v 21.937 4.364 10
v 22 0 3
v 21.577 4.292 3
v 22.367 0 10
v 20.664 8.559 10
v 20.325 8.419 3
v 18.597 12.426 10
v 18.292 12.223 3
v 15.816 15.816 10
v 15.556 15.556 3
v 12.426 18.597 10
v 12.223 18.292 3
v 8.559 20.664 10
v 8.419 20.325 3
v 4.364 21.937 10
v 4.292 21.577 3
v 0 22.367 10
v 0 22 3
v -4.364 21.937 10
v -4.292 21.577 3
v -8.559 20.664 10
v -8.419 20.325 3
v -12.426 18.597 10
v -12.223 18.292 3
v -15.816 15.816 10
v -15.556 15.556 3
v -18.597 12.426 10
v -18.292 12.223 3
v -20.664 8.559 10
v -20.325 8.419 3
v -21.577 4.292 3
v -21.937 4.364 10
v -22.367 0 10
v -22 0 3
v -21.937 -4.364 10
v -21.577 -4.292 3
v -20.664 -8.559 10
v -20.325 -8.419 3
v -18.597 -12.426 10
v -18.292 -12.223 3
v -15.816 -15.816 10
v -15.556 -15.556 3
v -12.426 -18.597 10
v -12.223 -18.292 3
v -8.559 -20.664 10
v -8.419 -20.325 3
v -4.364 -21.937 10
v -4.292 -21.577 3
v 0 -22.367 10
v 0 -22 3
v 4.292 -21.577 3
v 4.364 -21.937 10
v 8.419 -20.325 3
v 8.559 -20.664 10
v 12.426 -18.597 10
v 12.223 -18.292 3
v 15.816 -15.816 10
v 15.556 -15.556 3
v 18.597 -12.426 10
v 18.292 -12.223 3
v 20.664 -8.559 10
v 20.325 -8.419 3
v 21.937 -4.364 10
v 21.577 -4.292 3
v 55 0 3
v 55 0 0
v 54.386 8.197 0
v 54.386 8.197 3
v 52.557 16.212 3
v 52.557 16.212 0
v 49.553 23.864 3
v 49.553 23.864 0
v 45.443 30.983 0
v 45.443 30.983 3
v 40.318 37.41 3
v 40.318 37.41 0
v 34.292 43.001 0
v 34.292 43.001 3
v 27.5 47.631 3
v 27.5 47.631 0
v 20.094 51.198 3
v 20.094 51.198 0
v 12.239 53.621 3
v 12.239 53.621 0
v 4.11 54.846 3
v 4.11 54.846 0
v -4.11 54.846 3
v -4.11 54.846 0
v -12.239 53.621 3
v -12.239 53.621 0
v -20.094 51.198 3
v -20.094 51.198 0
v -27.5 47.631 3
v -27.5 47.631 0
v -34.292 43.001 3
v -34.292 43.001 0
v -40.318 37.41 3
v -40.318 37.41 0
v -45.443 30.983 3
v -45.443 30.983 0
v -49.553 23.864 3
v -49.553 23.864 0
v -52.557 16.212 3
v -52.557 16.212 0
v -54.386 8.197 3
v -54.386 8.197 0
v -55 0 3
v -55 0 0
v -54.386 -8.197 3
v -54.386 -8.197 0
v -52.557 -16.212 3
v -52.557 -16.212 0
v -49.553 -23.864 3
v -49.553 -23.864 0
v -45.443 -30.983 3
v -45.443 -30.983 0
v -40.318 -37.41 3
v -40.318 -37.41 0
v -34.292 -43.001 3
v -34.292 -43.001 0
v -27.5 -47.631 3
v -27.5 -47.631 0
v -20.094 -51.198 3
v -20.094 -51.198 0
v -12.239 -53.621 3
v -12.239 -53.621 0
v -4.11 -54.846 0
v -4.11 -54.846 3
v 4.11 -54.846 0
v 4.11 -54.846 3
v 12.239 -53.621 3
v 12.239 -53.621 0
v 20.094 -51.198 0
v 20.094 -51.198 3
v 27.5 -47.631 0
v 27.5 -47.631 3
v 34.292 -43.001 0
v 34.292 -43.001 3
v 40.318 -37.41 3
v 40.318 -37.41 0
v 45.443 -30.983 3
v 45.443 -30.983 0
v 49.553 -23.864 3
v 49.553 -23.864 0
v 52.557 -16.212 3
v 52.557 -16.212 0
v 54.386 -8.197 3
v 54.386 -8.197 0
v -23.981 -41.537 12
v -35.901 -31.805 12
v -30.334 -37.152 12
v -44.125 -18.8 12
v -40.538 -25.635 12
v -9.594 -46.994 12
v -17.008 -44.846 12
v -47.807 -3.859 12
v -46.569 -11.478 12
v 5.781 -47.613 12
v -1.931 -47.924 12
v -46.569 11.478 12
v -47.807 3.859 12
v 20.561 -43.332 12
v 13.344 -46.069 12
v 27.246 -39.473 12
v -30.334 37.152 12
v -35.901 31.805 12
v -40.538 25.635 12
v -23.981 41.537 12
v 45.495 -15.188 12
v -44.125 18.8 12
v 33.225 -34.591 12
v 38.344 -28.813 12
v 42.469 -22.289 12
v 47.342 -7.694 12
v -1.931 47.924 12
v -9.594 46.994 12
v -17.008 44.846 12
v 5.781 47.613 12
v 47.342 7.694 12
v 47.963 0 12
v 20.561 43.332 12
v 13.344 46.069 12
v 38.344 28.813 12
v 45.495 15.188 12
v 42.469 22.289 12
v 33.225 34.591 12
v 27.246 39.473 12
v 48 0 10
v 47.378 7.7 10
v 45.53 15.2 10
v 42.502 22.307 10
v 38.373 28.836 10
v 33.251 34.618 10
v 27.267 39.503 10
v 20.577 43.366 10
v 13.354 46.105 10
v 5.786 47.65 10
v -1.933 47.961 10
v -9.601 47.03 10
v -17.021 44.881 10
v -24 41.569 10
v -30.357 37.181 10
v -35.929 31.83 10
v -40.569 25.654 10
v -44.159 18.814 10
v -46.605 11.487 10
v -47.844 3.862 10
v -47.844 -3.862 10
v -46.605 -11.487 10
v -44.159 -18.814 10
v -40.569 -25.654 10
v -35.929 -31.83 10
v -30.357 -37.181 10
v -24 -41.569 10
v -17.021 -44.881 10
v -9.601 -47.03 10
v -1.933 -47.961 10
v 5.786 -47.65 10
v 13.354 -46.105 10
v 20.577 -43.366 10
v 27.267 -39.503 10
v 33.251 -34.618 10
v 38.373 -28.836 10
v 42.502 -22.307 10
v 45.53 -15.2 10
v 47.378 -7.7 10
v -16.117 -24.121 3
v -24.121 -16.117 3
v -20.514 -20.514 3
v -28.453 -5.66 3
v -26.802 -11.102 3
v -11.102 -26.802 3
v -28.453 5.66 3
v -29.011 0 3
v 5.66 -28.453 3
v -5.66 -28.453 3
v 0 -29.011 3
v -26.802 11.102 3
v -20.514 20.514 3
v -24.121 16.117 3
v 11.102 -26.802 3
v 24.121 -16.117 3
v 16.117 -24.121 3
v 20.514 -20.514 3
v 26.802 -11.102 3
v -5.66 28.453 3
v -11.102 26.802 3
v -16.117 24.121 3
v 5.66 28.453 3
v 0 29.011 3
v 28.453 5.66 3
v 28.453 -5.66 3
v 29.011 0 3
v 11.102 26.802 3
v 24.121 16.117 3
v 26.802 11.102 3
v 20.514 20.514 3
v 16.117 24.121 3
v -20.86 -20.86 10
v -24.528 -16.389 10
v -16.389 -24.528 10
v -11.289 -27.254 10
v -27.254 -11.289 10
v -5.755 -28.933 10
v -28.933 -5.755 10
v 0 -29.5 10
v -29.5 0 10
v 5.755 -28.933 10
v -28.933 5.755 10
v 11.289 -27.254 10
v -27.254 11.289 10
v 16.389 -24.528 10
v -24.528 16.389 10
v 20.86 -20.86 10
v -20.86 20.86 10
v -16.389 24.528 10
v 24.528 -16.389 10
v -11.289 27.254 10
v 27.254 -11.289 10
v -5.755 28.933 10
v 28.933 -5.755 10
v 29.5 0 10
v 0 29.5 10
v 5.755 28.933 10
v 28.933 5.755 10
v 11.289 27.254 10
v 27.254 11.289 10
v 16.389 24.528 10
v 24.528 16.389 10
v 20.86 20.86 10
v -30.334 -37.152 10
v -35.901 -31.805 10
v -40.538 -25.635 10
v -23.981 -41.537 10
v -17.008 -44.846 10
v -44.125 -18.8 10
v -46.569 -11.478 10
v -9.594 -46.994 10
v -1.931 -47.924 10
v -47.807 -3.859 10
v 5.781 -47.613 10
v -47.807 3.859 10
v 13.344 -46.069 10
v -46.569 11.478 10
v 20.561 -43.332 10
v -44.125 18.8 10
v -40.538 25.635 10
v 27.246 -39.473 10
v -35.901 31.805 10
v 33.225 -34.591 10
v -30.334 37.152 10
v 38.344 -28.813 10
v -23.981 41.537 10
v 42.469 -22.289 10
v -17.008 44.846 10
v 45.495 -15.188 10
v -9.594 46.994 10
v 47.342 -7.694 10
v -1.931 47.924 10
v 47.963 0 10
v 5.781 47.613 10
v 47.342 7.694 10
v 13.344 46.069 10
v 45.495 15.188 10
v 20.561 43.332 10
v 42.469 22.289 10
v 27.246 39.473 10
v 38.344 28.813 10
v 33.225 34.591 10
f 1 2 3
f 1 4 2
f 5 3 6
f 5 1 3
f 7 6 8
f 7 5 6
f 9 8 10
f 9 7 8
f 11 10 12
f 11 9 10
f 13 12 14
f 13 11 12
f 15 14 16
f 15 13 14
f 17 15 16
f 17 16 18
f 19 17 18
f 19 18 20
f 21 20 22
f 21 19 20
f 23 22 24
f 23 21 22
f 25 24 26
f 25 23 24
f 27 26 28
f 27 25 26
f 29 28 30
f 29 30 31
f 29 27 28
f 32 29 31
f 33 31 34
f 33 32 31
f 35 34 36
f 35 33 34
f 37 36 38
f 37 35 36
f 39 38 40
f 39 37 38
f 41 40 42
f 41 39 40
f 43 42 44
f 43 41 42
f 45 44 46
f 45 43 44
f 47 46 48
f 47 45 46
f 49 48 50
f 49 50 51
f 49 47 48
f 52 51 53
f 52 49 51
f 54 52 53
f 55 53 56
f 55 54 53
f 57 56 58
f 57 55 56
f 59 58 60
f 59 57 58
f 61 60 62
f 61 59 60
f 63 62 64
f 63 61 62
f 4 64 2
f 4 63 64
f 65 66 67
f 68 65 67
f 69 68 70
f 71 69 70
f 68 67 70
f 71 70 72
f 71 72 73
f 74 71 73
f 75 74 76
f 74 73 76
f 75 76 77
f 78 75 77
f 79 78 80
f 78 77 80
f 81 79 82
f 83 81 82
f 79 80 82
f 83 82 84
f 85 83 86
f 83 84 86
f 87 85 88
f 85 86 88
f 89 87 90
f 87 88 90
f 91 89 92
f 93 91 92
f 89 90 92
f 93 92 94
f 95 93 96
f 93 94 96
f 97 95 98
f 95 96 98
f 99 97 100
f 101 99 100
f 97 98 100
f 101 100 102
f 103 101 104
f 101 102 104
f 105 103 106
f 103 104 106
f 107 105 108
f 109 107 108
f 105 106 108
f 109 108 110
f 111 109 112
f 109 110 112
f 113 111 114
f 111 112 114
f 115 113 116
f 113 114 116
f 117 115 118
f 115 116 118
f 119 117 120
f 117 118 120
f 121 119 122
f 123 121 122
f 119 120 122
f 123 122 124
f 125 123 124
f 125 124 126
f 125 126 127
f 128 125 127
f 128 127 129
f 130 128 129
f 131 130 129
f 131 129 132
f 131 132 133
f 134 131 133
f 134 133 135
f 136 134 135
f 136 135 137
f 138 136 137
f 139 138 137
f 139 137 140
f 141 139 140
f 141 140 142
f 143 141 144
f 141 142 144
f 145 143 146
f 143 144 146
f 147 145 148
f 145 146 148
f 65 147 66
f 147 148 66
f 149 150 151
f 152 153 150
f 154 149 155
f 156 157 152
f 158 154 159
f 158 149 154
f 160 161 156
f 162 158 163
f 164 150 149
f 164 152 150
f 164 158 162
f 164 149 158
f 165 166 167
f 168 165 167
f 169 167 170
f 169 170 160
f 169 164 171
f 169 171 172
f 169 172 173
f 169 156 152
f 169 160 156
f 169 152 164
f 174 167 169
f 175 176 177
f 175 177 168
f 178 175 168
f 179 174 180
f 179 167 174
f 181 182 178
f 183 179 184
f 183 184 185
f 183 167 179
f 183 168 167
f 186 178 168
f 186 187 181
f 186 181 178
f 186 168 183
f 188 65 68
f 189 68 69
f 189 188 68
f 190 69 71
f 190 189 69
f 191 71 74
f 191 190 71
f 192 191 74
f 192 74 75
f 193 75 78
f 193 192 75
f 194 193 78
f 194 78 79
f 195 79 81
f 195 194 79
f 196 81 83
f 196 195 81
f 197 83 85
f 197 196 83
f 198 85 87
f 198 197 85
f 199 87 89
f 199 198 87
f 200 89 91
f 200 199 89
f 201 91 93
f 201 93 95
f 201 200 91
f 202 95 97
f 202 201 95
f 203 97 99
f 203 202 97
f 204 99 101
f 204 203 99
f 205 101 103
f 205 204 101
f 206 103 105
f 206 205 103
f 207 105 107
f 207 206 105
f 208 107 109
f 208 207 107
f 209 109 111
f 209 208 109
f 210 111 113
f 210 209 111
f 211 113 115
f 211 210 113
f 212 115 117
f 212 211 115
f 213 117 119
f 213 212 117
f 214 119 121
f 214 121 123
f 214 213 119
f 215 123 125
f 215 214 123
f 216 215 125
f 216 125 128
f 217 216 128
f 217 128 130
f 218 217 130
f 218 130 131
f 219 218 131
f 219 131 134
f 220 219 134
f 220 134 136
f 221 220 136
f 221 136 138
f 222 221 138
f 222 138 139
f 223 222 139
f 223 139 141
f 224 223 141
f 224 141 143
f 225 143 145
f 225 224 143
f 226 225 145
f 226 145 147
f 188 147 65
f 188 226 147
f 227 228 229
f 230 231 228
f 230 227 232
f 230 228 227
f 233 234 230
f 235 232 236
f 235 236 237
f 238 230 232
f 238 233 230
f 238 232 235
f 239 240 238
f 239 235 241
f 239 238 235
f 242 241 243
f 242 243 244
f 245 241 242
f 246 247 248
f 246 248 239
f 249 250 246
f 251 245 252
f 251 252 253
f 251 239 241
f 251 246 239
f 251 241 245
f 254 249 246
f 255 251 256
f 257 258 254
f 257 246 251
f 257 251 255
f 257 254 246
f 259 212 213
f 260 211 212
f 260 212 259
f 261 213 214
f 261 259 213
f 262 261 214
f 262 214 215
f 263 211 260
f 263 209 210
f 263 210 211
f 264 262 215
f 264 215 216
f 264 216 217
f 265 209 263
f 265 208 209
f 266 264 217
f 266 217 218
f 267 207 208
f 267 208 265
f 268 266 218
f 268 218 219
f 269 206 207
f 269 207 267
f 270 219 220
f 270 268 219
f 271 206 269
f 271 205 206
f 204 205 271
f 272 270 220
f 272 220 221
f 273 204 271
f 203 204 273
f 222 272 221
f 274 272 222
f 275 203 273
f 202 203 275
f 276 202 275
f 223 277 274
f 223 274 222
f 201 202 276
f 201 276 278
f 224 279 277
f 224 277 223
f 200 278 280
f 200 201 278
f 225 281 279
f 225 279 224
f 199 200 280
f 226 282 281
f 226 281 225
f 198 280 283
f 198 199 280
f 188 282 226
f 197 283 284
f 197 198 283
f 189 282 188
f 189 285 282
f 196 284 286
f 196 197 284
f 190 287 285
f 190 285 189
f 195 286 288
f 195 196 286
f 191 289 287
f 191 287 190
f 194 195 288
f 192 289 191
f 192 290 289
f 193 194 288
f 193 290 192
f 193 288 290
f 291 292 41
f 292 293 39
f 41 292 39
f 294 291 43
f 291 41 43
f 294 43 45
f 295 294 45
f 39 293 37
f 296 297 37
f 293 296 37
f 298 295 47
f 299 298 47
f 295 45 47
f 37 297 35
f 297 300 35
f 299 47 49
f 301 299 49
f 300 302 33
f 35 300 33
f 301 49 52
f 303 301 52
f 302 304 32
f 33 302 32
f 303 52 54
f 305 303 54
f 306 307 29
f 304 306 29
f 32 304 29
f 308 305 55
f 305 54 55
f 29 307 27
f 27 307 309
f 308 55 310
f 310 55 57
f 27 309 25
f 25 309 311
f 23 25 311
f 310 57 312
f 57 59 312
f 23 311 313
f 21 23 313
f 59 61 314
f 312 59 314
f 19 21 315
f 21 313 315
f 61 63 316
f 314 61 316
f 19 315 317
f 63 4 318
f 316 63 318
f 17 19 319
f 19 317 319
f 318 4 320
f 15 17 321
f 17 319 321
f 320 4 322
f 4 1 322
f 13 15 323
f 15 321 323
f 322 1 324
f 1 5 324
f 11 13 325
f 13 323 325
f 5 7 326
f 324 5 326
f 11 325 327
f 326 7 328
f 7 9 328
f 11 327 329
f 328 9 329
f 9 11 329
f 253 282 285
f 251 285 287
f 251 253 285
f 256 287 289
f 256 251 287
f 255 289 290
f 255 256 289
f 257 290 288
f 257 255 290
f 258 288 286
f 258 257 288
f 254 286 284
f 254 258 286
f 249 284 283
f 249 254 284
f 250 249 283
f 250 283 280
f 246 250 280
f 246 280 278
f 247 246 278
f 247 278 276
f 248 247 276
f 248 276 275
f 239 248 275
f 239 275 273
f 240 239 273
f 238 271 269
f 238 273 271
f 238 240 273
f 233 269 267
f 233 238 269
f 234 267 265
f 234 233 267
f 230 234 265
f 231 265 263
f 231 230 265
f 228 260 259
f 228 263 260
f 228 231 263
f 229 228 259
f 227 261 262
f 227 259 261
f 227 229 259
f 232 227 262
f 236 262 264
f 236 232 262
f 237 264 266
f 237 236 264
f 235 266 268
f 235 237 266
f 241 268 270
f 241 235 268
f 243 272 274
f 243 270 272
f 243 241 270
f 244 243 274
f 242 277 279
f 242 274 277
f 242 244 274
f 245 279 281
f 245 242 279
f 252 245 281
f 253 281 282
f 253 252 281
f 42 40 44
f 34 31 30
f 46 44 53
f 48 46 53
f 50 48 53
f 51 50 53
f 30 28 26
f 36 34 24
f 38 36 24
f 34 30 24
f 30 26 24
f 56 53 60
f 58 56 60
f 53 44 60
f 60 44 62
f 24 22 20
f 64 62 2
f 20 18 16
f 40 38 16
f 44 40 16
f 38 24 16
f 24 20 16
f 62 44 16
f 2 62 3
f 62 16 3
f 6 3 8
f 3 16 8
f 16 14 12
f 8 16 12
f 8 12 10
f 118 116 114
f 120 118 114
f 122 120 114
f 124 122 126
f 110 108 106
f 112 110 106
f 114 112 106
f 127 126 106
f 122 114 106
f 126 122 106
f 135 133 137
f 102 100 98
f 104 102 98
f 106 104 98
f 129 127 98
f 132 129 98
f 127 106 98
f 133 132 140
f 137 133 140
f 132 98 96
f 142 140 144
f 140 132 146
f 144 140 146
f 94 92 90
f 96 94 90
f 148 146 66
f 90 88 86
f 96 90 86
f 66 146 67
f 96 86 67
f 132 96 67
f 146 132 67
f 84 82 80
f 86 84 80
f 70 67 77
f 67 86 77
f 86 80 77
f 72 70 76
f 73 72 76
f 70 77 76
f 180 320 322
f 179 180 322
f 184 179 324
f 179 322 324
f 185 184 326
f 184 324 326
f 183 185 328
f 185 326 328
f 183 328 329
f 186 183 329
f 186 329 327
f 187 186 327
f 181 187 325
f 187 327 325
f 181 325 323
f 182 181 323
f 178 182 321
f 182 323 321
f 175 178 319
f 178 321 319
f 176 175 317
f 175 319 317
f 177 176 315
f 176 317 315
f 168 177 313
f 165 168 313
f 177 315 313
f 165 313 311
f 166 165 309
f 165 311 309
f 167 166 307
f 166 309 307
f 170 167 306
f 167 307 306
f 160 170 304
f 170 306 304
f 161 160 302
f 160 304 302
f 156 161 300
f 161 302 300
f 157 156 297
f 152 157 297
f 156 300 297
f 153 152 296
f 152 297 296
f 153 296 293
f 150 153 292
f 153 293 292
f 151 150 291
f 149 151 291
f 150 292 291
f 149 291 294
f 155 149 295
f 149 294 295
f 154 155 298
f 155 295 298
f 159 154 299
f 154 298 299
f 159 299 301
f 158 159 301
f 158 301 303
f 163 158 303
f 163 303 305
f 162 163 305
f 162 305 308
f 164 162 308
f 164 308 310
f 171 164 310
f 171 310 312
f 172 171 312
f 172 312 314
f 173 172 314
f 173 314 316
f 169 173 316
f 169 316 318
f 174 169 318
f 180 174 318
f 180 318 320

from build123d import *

# Parameters (mm, degrees)
F0_R     = 55
F1_DEPTH = 10
F2_SIZE  = 7
F3_R     = 29.5
F4_DEPTH = 7
F4_TAPER = 4
F5_R     = 22
F6_DEPTH = 7
F6_TAPER = -3
F8_R     = 47.9629336629
F9_DEPTH = 2


with BuildPart() as f1:
    # F0 (on Top) → F1 (new body)
    with BuildSketch(Plane.XY):
        Circle(F0_R)
    extrude(amount=F1_DEPTH)

    # F2
    f2_edges = [f1.edges().sort_by_distance(p)[0] for p in [
        (-55, 0, 10),
    ]]
    chamfer(f2_edges, length=F2_SIZE)

    # F3 (on face) → F4 (cut)
    with BuildSketch(Plane.XY.offset(10)):
        Circle(F3_R)
    extrude(amount=-F4_DEPTH, taper=F4_TAPER, mode=Mode.SUBTRACT)


with BuildPart() as f6:
    # F5 (on face) → F6 (new body, through all)
    with BuildSketch(Plane.XY.offset(3)):
        Circle(F5_R)
    extrude(amount=F6_DEPTH, taper=F6_TAPER)

    # F8 (on offset) → F9 (join)
    with BuildSketch(Plane.XY.offset(10)):
        Circle(F8_R)
    extrude(amount=F9_DEPTH)


solid = Compound([f1.part, f6.part])
